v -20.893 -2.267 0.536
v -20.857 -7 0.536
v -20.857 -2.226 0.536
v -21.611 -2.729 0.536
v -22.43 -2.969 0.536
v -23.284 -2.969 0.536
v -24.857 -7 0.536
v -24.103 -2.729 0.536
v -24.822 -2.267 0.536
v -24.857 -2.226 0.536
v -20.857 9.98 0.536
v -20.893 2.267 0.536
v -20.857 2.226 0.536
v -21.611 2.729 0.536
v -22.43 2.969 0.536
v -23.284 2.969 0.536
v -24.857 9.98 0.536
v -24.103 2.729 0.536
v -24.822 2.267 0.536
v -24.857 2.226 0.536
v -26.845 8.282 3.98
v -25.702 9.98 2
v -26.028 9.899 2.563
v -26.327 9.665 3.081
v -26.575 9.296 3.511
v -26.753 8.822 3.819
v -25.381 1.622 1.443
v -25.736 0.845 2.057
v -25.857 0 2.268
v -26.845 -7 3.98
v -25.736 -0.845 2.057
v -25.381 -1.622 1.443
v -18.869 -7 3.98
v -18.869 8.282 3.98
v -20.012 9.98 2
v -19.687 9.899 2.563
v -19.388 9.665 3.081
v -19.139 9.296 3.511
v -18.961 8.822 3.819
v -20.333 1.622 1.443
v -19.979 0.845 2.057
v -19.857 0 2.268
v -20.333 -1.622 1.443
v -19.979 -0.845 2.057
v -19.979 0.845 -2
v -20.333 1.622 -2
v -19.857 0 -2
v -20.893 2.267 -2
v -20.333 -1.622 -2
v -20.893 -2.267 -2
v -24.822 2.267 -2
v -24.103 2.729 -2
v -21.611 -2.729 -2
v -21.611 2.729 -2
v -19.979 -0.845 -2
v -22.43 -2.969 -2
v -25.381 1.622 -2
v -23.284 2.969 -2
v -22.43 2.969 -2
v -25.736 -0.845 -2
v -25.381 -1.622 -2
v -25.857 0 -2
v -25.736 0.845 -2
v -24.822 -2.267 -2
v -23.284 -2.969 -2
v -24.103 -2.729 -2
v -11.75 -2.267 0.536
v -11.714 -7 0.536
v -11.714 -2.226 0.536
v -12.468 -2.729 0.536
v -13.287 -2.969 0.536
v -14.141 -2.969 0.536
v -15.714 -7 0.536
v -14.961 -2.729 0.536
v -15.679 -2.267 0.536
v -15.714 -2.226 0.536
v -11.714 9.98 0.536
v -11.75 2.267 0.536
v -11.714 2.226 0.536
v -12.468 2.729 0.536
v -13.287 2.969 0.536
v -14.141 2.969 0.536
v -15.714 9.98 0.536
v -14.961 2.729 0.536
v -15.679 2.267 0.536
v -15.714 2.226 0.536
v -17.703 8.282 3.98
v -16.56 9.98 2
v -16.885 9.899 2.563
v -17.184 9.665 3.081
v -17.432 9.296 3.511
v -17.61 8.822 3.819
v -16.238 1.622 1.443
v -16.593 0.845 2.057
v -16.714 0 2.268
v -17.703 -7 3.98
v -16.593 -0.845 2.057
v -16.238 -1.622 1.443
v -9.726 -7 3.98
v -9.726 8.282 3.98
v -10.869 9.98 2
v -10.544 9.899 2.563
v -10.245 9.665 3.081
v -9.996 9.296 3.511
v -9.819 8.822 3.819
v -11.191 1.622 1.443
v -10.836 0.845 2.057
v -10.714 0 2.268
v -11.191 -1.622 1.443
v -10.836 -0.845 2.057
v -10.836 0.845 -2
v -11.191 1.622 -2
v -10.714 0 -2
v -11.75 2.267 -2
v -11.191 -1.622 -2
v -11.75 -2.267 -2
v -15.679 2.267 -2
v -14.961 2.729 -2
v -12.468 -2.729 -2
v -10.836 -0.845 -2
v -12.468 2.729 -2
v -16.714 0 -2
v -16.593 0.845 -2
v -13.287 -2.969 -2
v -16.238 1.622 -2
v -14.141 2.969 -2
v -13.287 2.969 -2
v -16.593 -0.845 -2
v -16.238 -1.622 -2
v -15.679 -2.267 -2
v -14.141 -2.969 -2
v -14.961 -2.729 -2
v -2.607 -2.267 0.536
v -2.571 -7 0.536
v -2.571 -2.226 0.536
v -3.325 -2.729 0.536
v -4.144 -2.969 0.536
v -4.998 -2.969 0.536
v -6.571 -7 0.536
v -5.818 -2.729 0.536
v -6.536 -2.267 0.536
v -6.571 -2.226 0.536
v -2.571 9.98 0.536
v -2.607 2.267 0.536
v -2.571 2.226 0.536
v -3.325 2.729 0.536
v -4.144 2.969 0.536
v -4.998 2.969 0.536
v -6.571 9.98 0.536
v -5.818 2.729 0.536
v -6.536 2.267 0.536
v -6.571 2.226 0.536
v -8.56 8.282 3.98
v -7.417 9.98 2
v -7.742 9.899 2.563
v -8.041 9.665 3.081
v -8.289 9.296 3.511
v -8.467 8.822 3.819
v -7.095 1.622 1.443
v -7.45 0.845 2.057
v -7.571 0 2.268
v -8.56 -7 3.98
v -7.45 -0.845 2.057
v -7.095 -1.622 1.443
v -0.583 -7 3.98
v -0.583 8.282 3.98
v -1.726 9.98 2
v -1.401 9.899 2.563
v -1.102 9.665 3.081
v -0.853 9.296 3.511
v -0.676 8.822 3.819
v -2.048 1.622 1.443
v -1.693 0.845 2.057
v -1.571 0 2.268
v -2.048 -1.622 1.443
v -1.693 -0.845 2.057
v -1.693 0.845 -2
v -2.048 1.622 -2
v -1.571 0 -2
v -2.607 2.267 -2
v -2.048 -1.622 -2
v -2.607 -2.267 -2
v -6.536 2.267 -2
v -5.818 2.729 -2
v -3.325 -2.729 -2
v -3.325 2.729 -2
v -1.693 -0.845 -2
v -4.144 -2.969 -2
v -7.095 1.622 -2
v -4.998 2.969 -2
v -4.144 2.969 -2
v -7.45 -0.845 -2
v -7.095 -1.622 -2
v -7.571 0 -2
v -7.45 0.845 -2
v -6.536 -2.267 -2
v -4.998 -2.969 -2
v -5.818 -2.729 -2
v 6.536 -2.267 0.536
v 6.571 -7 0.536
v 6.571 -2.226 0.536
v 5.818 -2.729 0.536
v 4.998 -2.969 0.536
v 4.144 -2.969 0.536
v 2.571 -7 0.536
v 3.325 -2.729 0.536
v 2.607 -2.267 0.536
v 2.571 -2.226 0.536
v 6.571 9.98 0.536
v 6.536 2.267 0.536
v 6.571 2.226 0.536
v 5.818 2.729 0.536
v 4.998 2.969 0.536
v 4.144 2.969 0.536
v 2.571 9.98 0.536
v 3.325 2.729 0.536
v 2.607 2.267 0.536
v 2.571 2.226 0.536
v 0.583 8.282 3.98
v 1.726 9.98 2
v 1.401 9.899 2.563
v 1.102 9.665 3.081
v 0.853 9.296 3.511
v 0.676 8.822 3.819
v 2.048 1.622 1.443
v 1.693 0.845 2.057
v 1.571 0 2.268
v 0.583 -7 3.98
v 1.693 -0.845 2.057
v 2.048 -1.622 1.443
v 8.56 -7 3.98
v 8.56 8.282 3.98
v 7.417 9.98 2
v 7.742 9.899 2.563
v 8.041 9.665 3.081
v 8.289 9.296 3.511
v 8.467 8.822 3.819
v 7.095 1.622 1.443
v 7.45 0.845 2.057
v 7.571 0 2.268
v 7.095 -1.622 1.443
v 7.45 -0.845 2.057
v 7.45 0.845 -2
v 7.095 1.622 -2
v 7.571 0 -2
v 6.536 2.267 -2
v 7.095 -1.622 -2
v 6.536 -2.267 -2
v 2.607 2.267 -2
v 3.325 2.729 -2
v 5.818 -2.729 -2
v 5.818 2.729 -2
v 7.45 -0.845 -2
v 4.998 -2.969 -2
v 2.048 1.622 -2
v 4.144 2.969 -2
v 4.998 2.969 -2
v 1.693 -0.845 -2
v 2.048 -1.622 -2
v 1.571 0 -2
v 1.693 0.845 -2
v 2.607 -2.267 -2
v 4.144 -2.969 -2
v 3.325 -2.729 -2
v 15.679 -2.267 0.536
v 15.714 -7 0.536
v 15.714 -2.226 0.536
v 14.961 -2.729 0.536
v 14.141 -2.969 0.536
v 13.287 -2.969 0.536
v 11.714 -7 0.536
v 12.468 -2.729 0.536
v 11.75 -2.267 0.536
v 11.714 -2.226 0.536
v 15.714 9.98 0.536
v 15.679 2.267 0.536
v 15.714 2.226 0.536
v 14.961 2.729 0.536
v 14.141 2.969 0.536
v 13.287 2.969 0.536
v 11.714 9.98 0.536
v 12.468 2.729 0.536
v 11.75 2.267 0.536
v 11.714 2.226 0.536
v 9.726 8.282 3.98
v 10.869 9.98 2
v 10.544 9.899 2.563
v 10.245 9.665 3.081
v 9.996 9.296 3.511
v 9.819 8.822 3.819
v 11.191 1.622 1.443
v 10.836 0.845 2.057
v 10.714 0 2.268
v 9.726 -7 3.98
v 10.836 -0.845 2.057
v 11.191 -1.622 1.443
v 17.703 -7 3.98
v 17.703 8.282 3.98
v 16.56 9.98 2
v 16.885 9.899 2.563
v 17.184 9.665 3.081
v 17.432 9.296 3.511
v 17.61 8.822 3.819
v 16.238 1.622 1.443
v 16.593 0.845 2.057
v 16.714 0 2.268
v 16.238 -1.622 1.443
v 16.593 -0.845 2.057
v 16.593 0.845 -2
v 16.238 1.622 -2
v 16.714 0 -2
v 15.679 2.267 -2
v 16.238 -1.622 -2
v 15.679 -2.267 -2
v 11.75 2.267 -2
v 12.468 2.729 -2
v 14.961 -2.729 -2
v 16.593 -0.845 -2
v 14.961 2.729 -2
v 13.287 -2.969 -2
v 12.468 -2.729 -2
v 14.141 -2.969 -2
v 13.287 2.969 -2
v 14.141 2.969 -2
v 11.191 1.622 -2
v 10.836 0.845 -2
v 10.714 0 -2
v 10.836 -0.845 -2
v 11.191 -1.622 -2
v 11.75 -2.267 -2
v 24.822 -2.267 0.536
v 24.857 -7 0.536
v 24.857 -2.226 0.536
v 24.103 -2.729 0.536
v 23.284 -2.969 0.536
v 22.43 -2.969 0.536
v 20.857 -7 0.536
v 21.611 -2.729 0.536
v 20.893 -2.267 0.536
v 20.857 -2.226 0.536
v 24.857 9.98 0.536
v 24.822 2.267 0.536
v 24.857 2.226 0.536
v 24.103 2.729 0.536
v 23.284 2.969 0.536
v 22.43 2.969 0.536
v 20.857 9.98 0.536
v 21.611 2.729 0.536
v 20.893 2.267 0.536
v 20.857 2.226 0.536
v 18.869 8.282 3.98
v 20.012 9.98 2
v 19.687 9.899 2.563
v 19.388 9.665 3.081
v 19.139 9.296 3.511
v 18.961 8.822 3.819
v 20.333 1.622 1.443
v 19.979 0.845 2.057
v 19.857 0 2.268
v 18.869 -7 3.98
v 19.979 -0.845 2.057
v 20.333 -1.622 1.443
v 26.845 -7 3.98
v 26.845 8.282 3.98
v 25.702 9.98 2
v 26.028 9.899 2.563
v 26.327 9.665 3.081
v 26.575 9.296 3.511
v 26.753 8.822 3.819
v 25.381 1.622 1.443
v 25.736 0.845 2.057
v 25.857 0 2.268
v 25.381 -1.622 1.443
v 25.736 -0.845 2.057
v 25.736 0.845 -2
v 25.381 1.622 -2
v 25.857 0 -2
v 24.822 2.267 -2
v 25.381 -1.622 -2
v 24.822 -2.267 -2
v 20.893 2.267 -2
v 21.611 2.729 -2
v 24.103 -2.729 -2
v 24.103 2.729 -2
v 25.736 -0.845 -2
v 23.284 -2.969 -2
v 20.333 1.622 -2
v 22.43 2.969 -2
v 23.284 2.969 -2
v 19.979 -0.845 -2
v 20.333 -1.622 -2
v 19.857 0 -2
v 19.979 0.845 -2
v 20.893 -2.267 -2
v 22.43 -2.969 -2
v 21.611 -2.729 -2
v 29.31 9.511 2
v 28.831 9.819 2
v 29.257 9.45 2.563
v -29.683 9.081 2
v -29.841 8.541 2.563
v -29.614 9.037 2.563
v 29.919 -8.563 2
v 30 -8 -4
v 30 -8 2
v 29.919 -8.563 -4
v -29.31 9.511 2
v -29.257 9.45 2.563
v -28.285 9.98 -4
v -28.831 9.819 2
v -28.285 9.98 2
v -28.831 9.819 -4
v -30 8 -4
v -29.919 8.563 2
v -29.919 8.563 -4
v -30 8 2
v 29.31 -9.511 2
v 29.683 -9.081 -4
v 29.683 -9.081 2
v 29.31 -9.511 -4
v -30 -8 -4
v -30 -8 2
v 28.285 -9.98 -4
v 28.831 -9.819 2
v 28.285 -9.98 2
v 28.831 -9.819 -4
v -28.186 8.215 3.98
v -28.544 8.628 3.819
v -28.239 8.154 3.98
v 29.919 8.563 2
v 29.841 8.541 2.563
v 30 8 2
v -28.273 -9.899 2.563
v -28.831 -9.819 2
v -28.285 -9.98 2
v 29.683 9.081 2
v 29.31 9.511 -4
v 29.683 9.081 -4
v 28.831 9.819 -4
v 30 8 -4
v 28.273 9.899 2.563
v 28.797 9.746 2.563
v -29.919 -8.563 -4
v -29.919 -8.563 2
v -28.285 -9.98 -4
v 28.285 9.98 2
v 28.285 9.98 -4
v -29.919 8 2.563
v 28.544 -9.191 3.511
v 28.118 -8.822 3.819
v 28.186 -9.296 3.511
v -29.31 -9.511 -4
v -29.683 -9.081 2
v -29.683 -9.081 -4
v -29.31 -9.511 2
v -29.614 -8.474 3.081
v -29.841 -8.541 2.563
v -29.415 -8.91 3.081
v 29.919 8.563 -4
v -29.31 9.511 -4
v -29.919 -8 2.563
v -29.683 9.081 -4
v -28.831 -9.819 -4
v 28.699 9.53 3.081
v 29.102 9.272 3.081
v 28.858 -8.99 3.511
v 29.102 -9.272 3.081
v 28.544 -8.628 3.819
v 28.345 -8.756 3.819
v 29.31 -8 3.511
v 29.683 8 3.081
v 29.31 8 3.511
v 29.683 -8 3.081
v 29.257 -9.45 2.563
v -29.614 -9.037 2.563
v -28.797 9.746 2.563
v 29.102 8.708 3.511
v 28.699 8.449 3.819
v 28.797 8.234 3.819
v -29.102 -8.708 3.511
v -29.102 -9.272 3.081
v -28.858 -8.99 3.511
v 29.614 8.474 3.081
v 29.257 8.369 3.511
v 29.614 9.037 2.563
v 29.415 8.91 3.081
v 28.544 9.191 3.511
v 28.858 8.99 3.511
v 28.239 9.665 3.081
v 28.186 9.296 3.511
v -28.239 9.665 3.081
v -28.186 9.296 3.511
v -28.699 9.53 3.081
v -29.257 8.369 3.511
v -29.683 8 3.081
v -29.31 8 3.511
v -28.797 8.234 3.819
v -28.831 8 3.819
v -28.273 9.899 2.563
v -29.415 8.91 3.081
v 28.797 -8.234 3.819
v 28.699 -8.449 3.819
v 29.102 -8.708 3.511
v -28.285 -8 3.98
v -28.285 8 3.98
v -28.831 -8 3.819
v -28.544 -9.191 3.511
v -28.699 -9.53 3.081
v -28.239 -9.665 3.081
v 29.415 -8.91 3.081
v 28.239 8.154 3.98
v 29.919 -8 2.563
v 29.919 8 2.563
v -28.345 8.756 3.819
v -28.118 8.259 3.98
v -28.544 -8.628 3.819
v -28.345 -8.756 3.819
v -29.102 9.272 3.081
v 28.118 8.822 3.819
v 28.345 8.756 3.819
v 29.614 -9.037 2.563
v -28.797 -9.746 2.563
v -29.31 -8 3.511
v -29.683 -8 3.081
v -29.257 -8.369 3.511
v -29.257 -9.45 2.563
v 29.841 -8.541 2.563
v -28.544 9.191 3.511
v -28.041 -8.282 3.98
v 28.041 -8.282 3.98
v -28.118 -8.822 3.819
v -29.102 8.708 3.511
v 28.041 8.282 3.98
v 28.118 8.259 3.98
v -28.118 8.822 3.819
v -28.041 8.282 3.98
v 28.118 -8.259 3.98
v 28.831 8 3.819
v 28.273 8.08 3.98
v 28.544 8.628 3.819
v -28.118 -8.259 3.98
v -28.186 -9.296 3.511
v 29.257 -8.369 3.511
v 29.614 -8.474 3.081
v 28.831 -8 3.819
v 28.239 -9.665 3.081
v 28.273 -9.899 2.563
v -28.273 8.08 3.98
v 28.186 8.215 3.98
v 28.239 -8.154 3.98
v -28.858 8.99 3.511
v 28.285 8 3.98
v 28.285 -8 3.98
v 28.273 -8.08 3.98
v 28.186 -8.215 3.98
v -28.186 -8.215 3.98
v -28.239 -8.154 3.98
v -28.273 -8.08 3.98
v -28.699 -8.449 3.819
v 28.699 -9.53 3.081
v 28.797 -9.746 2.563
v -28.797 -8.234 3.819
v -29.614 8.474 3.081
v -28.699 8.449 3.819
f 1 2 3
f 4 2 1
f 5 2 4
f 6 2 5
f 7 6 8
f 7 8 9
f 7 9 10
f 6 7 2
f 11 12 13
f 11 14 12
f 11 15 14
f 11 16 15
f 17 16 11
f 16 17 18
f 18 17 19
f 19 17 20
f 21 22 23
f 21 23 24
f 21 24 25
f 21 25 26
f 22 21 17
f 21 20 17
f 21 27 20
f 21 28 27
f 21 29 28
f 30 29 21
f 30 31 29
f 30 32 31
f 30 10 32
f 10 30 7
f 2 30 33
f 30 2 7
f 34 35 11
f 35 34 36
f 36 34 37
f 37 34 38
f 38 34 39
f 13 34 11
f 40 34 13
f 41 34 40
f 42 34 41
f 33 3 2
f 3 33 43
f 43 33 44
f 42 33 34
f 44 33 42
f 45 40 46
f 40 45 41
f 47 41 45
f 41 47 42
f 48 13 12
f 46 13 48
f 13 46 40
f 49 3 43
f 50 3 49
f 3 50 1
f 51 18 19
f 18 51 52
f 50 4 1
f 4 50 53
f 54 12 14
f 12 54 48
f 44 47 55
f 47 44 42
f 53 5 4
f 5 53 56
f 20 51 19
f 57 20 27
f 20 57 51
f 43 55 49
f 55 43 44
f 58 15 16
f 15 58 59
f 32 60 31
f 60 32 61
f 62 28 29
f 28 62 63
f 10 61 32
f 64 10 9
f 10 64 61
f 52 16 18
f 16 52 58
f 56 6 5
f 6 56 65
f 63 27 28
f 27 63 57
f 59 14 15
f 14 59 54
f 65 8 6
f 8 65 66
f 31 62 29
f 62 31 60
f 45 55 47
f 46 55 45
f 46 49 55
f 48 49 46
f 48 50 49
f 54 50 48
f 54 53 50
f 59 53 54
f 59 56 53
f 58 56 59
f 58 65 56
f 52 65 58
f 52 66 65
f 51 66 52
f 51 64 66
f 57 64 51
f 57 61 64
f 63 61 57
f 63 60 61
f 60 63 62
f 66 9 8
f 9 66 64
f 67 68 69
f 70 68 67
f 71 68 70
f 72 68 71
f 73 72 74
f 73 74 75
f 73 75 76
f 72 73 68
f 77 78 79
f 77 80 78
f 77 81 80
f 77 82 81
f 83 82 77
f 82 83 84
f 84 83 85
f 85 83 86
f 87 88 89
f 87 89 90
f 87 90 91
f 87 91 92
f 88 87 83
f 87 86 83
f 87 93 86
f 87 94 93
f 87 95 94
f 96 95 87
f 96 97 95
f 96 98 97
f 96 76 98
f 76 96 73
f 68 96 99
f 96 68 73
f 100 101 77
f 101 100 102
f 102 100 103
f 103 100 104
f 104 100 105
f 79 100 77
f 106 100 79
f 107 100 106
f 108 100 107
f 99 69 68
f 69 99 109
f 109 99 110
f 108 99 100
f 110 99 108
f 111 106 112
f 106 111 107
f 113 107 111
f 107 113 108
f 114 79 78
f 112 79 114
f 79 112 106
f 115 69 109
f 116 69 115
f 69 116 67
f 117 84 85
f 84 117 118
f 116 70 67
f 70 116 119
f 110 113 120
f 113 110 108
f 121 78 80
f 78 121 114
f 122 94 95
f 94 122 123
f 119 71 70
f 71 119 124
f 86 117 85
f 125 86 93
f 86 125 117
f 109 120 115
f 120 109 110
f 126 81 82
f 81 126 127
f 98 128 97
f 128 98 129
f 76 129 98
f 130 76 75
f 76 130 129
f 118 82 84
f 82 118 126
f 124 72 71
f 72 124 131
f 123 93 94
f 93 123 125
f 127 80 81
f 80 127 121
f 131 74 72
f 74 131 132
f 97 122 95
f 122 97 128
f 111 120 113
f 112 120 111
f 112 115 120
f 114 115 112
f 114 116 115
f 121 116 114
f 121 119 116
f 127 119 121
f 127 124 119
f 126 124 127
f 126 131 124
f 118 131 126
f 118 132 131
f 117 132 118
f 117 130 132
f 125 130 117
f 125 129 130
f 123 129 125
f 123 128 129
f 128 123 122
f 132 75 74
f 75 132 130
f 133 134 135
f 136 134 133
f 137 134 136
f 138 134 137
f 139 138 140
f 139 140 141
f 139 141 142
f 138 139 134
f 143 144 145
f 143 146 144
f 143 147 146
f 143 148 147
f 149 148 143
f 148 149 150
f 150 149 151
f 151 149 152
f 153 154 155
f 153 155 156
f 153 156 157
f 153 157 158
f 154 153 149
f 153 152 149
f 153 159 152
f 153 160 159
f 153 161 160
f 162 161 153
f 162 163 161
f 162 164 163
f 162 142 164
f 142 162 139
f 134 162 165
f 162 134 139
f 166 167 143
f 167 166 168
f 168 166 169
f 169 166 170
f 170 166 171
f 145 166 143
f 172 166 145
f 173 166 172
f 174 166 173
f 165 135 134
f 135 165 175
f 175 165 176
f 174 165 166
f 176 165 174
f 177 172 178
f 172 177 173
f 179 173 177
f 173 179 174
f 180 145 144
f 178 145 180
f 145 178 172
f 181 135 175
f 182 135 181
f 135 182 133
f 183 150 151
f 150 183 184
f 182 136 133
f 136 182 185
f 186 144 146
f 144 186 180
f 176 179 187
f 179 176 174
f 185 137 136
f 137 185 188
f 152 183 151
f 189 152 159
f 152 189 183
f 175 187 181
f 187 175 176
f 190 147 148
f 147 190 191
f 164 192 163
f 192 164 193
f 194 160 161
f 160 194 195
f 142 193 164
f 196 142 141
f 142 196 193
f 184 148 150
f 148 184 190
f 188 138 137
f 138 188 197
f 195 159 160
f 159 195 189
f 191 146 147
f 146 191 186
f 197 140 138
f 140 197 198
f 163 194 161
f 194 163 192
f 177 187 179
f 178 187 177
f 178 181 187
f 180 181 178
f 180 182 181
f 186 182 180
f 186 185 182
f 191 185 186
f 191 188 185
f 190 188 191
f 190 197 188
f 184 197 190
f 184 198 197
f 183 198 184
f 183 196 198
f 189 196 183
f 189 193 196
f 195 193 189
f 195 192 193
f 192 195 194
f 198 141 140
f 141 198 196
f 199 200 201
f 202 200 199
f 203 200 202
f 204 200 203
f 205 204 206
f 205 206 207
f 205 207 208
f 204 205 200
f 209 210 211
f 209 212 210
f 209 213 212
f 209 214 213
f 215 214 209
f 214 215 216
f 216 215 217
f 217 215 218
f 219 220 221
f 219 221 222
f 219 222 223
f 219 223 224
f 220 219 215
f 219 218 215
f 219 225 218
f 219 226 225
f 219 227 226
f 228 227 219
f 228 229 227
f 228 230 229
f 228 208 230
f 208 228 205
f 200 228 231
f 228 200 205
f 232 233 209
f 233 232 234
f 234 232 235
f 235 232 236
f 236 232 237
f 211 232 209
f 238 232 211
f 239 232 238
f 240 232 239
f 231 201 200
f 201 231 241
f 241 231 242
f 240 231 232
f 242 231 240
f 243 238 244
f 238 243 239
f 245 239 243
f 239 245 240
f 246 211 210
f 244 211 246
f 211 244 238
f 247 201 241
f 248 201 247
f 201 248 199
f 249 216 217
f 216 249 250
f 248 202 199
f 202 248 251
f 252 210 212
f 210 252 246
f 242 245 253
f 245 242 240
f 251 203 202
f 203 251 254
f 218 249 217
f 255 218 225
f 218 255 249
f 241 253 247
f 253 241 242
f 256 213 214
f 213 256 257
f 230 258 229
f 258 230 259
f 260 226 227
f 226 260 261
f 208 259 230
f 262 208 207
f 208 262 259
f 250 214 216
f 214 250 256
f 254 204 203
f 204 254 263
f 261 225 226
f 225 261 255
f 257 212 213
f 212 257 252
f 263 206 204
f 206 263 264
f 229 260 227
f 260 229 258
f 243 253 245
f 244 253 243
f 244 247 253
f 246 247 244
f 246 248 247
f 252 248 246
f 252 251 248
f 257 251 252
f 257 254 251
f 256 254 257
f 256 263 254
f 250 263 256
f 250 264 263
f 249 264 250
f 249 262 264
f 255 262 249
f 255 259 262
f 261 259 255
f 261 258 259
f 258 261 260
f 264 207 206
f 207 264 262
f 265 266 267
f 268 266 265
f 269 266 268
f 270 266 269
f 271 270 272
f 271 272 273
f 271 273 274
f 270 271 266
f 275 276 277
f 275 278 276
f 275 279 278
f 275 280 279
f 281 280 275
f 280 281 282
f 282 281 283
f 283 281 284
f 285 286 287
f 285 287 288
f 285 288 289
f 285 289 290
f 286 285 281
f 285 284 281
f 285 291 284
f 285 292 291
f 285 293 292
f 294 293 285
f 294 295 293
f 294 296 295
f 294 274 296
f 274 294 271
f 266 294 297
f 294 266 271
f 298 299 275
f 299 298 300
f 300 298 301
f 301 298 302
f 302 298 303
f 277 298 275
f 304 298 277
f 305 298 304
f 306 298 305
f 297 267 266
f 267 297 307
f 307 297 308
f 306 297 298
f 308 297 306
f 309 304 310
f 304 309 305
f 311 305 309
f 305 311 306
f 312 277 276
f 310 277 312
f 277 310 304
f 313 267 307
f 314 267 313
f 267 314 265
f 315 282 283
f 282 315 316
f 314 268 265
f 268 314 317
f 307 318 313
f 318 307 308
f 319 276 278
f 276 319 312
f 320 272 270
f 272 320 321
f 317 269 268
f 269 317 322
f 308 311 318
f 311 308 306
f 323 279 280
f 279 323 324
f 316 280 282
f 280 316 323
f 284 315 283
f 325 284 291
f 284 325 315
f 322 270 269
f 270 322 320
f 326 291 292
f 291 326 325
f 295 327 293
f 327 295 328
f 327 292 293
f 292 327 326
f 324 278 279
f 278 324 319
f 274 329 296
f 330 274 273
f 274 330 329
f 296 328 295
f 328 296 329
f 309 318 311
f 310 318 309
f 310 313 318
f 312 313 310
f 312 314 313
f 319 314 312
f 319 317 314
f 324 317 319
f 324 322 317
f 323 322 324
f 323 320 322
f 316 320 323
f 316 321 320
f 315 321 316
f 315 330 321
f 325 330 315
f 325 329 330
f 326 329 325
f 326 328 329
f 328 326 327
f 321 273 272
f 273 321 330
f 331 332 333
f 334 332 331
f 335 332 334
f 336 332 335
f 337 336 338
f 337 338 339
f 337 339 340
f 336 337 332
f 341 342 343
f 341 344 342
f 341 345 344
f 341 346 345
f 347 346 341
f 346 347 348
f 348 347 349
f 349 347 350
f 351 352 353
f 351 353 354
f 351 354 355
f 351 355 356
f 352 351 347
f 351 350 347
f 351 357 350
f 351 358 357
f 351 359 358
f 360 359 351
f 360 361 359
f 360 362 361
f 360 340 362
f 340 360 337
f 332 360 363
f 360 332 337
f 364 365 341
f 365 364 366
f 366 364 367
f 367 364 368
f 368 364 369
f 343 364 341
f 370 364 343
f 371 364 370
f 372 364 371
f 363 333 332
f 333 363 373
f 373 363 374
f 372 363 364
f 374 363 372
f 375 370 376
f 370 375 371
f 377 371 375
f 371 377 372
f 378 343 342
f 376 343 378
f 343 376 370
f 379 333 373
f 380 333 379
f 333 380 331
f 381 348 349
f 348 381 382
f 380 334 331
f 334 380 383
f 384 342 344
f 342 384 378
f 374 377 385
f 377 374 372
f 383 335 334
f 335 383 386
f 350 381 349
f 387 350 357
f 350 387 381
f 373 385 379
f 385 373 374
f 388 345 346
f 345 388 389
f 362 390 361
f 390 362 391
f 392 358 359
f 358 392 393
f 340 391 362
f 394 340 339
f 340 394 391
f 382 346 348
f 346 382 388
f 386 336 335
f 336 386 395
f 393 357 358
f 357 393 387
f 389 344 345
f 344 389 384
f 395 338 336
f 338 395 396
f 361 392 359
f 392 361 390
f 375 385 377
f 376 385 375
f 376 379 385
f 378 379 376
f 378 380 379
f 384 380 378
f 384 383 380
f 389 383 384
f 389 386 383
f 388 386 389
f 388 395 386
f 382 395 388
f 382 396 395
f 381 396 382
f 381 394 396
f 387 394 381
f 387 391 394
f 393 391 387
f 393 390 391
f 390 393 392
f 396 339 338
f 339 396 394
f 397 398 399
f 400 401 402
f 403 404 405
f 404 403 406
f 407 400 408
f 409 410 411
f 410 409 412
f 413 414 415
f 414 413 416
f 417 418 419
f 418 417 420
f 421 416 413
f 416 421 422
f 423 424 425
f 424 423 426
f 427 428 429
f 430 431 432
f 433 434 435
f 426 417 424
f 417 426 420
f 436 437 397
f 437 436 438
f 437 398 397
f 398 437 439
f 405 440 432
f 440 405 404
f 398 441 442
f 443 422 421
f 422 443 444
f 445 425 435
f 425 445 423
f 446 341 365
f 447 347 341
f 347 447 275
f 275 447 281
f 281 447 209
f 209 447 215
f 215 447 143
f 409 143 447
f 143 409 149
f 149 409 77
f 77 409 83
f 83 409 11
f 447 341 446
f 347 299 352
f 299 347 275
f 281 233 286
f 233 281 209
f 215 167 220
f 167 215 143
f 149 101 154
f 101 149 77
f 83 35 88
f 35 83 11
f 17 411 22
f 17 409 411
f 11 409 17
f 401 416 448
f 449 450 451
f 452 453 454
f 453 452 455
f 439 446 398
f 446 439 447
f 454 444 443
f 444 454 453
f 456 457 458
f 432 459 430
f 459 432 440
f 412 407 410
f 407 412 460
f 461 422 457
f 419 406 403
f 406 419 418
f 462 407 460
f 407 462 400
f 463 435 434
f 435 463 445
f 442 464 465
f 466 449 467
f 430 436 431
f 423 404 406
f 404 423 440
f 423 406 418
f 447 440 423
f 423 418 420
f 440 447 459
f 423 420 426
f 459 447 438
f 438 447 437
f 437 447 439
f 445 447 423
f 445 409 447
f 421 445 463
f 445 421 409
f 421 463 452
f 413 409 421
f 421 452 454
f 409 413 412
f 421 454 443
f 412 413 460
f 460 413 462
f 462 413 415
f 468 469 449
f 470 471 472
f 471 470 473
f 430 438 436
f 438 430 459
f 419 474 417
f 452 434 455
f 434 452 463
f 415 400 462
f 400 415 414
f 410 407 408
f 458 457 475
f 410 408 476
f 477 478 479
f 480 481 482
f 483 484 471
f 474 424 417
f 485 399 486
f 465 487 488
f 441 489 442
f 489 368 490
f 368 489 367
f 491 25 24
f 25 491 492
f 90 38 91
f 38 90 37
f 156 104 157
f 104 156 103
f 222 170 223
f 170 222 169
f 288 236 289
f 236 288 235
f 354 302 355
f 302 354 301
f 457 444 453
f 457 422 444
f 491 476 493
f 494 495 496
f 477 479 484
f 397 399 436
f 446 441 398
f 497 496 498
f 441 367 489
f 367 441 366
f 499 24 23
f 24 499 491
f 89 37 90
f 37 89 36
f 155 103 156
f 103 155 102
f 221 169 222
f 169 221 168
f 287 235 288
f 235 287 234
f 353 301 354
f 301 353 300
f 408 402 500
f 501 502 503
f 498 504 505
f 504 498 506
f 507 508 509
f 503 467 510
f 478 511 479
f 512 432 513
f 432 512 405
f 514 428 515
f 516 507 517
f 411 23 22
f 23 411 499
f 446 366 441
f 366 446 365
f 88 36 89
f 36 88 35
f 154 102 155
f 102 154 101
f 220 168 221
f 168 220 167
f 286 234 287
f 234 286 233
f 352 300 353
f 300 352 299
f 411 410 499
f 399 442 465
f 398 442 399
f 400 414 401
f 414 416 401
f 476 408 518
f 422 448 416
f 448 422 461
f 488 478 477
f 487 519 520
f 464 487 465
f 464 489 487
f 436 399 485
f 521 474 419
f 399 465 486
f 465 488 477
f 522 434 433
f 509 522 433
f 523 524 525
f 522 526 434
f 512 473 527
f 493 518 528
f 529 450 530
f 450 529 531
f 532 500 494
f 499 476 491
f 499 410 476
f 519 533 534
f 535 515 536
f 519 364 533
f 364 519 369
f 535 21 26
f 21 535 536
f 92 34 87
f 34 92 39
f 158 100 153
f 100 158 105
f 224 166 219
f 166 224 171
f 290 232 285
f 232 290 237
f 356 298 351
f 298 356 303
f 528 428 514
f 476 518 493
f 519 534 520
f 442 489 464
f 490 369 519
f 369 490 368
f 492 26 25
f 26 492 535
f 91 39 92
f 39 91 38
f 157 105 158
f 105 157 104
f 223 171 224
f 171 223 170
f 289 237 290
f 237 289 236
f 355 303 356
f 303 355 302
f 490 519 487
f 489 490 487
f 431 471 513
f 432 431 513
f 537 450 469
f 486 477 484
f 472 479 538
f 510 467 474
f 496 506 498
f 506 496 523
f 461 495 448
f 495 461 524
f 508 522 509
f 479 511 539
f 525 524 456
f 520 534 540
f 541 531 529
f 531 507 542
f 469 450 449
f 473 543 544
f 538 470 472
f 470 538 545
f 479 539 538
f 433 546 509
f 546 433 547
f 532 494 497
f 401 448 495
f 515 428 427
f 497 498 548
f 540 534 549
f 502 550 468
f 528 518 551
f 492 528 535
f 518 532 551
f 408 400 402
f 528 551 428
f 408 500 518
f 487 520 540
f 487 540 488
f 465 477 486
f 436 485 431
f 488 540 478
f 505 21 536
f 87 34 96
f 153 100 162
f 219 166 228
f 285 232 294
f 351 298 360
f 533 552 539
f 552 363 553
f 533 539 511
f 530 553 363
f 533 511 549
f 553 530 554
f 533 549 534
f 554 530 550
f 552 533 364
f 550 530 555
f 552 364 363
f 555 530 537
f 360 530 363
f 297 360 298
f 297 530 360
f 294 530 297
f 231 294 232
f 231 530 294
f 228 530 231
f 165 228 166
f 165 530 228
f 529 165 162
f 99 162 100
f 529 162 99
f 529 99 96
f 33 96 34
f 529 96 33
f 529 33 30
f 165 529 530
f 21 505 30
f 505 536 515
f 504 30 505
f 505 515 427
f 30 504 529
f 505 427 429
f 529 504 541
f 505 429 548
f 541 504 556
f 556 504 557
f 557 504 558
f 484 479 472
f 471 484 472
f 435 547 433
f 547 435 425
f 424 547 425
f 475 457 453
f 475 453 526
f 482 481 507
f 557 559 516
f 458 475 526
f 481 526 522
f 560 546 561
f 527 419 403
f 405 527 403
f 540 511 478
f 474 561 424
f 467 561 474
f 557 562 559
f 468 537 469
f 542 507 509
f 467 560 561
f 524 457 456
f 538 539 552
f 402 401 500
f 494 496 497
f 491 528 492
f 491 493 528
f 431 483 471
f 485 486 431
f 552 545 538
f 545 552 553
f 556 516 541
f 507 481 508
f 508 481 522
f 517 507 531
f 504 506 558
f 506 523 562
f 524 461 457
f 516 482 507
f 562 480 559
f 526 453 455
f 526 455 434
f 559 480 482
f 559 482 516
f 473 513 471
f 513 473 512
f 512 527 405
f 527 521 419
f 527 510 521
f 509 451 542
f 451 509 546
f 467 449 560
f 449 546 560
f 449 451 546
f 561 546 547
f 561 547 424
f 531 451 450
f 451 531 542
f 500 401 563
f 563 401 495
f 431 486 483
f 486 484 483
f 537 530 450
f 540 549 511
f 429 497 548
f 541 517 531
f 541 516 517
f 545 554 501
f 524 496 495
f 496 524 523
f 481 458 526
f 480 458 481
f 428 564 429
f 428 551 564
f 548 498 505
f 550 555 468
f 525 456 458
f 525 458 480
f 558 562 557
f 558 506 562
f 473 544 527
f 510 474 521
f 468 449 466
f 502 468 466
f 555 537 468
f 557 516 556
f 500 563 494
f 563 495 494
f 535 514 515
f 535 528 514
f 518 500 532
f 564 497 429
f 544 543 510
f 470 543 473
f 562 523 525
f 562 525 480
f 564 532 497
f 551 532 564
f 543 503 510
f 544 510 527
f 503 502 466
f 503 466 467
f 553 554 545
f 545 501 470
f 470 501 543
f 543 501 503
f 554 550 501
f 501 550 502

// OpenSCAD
// Drill bit holder for attaching to whatever
// CC
// Authr: Neon22 April 2018

// Holder length
holder_length = 60;   // [10:200]
// Holder Depth
holder_depth  = 8;     // [6:20]
// Holder Height
holder_height = 20;    // [10:60]
// Corner Rounding
rounding = 4;          // [1:6]
// Base support thickness
support_thickness = 3; // [1:8]

//Width of Bits
bit_size = 8;     // [3:0.25:10]
// How many bits to hold
howmany_bits  = 6;  // [2:12]
// Magnet diameter
magnet_dia   = 6;   // [3:10]
// Magnet thickness
magnet_depth = 2;   // [1:0.5:6]

/* [Hidden] */
Delta = 0.1;
cyl_res = 22;

// Hex shaped drill bit cutouts
module bit () {
	cylinder(d=bit_size, h=holder_height, $fn=6, center=true);
}

// Hole for the round magnets
module magnet() {
	cylinder(d=magnet_dia,$fn=cyl_res,h=holder_depth,center=true);
}

// corner posts with rounded tops to be hulled together
module corner () {
	y= holder_depth-rounding/2;
	translate([0,0,-rounding/4]) {
		cylinder(d=rounding, h=y, $fn=cyl_res, center=true);
		translate([0,0,y/2])
			sphere(d=rounding, center=true, $fn=cyl_res);
	}
}

// hull 4 corner posts together
module base() {
	w = (holder_length-rounding)/2;
	h = (holder_height-rounding)/2;
	hull() {
		translate([-w,-h,0]) corner();
		translate([-w,+h,0]) corner();
		translate([w,-h,0]) corner();
		translate([w,+h,0]) corner();
	}
	
}

// bring it all together
module holder() {
	active_length = holder_length+rounding;
	stepsize = active_length/(howmany_bits+1);
	start_offset = stepsize*(howmany_bits+1)/2;
	difference() {
		base();
		for (i = [1: howmany_bits]) {
			// bits
			translate([-start_offset+stepsize*i, support_thickness, holder_depth/2])
			rotate([90,0,0])
				bit();
			// magnets
			translate([-start_offset+stepsize*i, 0, holder_depth-bit_size/2-magnet_depth])
				magnet();
		}
	}
}

holder();
